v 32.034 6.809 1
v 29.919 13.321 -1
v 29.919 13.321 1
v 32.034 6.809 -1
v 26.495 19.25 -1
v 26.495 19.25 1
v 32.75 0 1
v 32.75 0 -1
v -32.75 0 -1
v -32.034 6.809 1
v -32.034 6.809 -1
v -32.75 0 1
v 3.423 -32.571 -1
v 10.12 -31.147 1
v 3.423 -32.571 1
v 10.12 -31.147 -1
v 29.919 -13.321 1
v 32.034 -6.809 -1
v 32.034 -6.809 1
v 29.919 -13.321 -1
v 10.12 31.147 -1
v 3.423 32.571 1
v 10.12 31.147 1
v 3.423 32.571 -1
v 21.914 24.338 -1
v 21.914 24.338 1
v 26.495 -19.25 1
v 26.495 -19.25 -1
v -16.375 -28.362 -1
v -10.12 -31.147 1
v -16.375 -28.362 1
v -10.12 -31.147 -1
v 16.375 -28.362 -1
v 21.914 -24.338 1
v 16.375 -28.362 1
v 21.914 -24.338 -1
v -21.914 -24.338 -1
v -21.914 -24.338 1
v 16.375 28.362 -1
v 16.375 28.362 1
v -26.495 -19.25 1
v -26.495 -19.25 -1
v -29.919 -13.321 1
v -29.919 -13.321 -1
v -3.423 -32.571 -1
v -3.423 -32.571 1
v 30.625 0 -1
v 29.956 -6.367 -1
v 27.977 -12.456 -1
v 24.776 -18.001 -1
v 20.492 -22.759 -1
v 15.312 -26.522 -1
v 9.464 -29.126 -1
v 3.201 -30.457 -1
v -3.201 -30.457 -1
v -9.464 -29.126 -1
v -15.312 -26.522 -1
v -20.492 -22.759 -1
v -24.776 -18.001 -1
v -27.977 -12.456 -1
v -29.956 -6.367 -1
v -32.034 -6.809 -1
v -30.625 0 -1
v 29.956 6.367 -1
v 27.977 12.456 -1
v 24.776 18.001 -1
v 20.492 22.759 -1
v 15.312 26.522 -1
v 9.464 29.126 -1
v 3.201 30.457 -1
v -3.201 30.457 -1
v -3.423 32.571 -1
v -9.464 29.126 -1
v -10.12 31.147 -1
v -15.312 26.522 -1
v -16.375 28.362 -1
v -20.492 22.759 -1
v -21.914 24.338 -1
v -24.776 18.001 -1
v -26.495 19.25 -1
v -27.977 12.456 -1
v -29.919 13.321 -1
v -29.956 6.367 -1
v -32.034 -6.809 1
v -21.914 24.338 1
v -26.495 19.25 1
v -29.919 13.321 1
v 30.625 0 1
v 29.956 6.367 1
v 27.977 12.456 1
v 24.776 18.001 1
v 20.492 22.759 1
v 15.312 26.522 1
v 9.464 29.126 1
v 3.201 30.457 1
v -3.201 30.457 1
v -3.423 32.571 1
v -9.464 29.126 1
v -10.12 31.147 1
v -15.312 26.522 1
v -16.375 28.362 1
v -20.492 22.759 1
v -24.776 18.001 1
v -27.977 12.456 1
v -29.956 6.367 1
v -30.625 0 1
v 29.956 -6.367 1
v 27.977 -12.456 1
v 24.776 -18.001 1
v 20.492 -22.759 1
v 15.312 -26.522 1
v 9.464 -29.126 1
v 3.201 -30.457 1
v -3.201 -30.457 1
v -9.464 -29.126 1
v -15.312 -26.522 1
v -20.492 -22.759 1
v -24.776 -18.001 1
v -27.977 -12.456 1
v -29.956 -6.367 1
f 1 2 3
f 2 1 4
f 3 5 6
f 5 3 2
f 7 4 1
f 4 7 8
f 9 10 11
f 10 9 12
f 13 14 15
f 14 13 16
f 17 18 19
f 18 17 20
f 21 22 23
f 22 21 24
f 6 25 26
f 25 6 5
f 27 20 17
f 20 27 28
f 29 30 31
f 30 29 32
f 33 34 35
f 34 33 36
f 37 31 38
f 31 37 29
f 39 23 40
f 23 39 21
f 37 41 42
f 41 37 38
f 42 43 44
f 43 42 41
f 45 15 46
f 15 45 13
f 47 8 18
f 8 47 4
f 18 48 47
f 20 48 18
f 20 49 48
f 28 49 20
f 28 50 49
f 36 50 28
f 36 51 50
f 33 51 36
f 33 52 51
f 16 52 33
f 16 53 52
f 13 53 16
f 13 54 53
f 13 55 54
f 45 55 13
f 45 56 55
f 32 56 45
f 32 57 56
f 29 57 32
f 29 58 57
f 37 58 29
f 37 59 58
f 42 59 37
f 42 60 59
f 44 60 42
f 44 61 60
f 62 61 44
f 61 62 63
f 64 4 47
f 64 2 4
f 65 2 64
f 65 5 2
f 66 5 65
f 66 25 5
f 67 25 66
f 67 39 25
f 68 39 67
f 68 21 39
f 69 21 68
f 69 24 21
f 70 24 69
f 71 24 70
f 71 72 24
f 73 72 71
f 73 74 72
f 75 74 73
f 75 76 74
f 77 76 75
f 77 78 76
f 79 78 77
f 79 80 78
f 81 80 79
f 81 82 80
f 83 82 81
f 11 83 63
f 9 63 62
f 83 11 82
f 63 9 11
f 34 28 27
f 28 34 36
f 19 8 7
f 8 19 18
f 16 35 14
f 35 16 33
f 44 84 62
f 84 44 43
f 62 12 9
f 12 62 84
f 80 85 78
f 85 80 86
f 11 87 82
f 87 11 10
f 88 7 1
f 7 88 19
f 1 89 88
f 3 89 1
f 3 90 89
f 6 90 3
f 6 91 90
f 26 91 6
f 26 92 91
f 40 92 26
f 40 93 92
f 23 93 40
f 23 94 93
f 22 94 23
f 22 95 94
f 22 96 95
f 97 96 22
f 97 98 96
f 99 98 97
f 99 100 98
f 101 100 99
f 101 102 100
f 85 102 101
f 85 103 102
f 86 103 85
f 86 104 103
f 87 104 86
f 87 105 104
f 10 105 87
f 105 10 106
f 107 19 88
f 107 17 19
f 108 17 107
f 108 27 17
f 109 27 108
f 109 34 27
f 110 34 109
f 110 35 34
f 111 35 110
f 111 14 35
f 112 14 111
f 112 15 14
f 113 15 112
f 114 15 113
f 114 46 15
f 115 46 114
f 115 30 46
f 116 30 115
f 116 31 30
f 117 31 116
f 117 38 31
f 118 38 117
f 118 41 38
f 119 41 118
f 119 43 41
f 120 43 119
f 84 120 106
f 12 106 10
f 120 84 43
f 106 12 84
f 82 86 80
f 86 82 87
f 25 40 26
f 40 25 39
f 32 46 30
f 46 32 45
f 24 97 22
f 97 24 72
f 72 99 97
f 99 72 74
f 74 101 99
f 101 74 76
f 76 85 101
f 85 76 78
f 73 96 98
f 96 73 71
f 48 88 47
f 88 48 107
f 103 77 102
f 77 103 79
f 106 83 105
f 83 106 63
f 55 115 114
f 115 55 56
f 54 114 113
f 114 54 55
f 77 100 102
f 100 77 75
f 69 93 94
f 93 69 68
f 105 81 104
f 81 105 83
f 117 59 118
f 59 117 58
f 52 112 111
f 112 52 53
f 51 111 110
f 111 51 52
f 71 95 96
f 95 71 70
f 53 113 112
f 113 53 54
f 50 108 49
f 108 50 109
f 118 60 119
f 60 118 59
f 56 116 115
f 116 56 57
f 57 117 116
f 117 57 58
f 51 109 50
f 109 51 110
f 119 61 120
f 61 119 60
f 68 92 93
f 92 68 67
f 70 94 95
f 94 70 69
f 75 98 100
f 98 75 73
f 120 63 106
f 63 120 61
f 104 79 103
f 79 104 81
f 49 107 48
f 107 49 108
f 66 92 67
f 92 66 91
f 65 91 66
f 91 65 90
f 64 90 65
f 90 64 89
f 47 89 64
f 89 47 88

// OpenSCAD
DIA_OUTER_RING =  65.5;
DIA_INNER_RING = DIA_OUTER_RING -4.25;
HEIGHT_RING = 2.0;

difference(){
	linear_extrude(height = HEIGHT_RING, center = true){
		circle(d=DIA_OUTER_RING);
	}

	linear_extrude(height = 4*HEIGHT_RING, center = true){
		circle(d=DIA_INNER_RING);
	}
}
